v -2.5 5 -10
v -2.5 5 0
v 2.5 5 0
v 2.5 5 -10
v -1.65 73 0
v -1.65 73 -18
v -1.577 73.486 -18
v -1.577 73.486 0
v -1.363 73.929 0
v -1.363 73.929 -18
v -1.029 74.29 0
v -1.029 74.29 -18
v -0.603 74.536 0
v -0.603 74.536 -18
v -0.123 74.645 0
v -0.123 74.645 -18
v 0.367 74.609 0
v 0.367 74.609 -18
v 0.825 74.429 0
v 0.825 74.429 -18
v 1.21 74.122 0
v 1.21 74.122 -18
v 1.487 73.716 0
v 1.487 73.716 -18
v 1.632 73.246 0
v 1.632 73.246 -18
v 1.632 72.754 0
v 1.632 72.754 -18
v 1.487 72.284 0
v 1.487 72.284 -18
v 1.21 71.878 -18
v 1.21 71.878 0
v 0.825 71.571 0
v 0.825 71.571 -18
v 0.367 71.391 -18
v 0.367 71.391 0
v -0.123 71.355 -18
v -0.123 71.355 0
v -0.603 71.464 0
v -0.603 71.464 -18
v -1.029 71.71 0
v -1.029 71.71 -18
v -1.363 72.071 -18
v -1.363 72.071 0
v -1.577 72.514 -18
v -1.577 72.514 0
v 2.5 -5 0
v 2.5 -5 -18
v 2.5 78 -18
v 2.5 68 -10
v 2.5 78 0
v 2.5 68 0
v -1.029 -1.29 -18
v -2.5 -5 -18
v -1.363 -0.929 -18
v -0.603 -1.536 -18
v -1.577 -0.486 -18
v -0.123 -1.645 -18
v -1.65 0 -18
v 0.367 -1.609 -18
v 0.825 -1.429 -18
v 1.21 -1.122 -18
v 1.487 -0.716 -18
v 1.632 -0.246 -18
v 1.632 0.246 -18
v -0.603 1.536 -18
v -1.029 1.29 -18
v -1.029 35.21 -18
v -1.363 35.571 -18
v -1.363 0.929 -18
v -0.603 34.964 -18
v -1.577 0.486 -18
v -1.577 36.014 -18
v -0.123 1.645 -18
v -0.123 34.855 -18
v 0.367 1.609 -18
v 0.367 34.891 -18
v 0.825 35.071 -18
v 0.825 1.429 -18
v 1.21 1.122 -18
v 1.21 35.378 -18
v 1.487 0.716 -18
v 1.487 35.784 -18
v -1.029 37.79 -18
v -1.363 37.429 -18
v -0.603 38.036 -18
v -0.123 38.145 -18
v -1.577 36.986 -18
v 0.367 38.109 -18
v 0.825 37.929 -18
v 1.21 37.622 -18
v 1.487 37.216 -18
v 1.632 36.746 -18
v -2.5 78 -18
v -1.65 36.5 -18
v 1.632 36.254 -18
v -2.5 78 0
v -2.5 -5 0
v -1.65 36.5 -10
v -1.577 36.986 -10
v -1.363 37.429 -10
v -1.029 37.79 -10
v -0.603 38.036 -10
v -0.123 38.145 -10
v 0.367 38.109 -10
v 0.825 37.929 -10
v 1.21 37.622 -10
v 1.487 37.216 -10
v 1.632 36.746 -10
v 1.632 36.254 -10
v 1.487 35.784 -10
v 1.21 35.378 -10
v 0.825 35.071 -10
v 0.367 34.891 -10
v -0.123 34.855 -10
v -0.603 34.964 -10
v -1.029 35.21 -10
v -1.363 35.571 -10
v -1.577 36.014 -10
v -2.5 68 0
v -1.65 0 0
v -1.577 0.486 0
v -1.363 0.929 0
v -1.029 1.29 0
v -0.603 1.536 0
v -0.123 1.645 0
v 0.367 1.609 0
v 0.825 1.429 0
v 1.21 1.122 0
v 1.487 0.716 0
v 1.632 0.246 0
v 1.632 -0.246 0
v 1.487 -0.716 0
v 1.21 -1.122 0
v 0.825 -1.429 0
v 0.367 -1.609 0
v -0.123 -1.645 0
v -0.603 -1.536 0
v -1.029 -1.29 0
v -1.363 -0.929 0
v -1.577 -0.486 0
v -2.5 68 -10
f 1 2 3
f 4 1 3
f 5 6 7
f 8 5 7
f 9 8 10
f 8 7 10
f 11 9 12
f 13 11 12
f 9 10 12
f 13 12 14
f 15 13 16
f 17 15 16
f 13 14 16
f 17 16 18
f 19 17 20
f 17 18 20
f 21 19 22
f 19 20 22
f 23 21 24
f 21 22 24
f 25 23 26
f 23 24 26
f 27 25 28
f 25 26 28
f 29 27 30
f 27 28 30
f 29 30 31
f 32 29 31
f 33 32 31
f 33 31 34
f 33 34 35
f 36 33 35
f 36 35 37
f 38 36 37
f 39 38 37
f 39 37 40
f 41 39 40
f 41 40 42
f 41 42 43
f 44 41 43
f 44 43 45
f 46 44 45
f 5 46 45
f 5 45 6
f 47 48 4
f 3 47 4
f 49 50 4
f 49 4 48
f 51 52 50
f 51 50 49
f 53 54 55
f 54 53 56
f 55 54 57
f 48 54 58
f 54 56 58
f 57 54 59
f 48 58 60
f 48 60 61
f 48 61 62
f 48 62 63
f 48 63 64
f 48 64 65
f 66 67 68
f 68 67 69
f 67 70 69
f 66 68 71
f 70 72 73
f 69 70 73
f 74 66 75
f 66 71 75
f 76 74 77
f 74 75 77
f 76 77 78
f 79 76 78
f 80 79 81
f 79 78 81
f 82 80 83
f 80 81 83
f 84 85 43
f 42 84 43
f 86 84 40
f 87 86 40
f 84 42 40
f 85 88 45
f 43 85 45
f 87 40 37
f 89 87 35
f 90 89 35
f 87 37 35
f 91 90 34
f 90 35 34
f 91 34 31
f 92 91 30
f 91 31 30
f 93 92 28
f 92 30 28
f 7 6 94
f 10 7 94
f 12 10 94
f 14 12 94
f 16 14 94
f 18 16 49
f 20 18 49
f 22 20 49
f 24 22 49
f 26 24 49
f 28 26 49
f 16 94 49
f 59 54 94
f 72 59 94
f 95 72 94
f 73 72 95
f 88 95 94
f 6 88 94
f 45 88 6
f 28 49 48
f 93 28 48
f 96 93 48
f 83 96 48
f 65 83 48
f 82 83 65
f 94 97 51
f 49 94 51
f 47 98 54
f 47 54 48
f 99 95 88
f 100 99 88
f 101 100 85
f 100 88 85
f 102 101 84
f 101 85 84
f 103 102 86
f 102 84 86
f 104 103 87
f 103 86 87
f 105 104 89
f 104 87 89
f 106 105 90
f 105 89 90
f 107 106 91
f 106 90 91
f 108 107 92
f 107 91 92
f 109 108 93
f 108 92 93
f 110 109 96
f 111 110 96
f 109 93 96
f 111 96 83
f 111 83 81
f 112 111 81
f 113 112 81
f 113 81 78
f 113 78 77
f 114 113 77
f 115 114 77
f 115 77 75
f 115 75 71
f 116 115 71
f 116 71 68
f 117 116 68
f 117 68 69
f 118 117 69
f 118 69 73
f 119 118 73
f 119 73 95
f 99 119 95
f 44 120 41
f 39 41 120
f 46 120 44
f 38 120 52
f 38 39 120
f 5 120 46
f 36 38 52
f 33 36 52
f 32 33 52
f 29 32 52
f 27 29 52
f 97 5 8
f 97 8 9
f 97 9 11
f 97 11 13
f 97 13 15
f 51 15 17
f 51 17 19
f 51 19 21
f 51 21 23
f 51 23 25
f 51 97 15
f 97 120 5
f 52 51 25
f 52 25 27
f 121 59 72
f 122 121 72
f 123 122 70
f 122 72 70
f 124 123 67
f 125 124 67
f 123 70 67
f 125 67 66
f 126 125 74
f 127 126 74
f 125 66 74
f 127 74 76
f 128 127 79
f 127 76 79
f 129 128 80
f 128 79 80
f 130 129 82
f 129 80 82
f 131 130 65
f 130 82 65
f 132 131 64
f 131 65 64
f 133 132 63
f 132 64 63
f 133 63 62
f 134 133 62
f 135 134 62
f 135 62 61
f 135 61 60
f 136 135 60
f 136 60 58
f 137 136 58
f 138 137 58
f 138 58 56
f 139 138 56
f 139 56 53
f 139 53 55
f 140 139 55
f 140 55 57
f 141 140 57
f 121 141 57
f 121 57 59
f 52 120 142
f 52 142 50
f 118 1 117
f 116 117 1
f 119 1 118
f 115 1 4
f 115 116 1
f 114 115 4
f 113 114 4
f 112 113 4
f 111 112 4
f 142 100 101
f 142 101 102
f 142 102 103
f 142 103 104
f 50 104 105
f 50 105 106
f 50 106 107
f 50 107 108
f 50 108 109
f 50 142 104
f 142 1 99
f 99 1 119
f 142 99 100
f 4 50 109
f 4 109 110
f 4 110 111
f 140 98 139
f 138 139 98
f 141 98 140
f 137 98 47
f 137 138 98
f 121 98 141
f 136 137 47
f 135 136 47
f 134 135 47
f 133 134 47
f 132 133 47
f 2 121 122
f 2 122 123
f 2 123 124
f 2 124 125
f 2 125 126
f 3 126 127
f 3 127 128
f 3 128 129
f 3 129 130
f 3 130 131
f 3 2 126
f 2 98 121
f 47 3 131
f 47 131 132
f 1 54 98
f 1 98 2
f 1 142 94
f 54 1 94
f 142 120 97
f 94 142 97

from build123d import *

# Parameters (mm, degrees)
ESQUISSE1_W             = 5
ESQUISSE1_H             = 83
BOSS_EXTRU_1_DEPTH      = 18
TROU_TARAUD_M4_D        = 3.3
ESQUISSE4_W             = 5
ESQUISSE4_H             = 63
ENL_V_MAT_EXTRU_1_DEPTH = 10


with BuildPart() as part:
    # Esquisse1 → Boss.-Extru.1 (new body)
    with BuildSketch(Plane.XY):
        with Locations((0, 36.5)):
            Rectangle(ESQUISSE1_W, ESQUISSE1_H)
    extrude(amount=-BOSS_EXTRU_1_DEPTH)

    # Trou taraudé M4 (through all)
    with Locations(Plane.XY):
        with Locations((0, 0), (0, 36.5), (0, 73)):
            Hole(TROU_TARAUD_M4_D / 2)

    # Esquisse4 → Enlèv. mat.-Extru.1 (cut)
    with BuildSketch(Plane.XY):
        with Locations((0, 36.5)):
            Rectangle(ESQUISSE4_W, ESQUISSE4_H)
    extrude(amount=-ENL_V_MAT_EXTRU_1_DEPTH, mode=Mode.SUBTRACT)


solid = part.part
